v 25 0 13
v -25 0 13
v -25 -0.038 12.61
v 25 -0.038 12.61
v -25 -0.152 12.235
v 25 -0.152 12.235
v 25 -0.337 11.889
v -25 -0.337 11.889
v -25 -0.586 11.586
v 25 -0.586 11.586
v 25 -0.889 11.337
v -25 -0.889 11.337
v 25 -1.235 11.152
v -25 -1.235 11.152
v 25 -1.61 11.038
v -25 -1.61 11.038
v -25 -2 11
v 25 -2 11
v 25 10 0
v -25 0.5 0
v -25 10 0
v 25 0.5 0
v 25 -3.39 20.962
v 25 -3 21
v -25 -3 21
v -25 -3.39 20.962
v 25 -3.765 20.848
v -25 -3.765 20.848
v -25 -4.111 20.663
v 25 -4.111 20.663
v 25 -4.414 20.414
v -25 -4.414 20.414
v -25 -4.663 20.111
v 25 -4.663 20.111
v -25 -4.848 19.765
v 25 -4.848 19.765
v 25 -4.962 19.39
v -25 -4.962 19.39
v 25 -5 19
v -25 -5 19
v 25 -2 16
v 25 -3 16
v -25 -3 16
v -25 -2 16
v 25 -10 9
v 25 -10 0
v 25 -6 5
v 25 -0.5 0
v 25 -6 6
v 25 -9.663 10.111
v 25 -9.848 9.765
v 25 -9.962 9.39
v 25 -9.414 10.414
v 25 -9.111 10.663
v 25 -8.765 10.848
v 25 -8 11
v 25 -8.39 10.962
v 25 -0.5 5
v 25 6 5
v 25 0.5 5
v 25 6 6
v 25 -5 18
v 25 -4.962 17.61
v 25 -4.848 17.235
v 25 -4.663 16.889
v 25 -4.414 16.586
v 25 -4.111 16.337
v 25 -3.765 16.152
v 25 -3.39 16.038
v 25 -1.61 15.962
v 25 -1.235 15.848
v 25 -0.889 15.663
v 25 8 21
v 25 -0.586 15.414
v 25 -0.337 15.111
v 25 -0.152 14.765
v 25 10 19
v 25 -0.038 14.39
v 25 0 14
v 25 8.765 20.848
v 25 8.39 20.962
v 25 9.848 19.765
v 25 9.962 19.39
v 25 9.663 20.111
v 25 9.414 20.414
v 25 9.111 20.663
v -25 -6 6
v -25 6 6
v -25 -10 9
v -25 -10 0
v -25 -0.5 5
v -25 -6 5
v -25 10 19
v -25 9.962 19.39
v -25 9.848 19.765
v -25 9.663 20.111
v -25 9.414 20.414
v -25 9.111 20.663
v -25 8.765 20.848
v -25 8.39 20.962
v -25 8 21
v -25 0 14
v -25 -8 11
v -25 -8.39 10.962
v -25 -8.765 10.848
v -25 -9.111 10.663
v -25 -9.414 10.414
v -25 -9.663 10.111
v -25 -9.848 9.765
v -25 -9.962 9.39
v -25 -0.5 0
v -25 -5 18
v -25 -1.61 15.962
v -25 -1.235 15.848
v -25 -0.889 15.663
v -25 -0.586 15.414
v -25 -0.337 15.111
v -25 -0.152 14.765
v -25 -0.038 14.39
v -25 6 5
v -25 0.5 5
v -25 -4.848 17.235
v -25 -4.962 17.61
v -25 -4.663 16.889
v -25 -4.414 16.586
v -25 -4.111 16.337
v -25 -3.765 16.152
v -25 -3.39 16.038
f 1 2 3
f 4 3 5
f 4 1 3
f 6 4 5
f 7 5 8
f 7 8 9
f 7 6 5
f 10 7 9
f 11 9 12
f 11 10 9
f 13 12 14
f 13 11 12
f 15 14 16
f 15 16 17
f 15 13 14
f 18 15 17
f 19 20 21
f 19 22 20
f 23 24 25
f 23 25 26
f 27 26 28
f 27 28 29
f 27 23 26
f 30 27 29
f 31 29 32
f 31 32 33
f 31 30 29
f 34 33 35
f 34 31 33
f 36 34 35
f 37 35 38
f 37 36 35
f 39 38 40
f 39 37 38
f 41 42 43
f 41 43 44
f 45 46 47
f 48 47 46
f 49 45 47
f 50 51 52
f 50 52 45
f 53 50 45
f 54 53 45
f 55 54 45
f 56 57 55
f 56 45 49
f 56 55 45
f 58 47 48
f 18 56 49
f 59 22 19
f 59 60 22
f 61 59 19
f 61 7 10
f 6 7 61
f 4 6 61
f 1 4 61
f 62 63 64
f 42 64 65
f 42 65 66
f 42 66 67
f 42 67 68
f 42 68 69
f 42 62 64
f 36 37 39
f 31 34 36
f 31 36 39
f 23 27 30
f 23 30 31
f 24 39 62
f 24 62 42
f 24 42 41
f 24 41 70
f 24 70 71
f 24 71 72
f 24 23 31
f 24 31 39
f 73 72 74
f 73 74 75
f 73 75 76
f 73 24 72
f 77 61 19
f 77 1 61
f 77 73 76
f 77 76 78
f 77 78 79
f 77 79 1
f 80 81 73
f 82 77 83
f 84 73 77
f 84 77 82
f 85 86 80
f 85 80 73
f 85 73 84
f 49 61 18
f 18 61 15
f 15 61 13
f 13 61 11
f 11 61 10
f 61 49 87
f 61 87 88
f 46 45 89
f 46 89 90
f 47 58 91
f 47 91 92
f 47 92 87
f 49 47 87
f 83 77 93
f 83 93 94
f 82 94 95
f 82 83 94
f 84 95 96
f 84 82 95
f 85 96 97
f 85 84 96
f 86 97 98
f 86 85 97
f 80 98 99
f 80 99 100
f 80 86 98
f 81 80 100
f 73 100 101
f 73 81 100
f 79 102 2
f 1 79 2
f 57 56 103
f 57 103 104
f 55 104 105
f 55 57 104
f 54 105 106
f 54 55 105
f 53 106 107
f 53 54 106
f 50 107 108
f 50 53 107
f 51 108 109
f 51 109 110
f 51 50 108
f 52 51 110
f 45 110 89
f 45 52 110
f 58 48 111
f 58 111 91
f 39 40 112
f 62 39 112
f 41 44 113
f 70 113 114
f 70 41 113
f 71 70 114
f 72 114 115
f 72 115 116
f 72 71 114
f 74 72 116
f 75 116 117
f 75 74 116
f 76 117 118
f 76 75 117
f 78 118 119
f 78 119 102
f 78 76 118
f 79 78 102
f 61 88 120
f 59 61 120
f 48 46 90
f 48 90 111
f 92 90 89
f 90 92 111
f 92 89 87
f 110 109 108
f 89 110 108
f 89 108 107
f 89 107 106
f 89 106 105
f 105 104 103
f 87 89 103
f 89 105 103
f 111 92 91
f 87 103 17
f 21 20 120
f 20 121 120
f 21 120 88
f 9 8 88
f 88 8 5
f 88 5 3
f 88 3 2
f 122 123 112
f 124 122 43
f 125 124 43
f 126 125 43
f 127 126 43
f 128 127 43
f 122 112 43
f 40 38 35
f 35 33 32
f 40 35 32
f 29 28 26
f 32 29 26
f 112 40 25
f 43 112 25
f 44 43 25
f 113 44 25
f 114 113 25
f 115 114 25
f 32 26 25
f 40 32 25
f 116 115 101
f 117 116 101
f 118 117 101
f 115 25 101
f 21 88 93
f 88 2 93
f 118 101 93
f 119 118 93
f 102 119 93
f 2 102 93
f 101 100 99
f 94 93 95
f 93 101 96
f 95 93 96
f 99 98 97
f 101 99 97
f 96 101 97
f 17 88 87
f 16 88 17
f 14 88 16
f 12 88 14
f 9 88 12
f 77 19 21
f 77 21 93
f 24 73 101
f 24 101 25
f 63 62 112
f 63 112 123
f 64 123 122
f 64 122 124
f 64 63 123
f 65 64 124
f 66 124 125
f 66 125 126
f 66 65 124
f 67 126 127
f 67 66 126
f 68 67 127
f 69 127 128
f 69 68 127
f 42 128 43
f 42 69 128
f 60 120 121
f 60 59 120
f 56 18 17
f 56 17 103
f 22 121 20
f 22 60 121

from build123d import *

# Parameters (mm, degrees)
F1_DEPTH = 25


with BuildPart() as f1:
    # F0 (on Right) → F1 (new body, symmetric)
    with BuildSketch(Plane.YZ):
        with BuildLine():
            Line((0.5, 0), (10, 0))
            Line((10, 0), (10, 19))
            ThreePointArc((10, 19), (9.414214, 20.414214), (8, 21))
            Line((8, 21), (-3, 21))
            ThreePointArc((-3, 21), (-4.414214, 20.414214), (-5, 19))
            Line((-5, 19), (-5, 18))
            ThreePointArc((-5, 18), (-4.414214, 16.585786), (-3, 16))
            Line((-3, 16), (-2, 16))
            ThreePointArc((-2, 16), (-0.585786, 15.414214), (0, 14))
            Line((0, 14), (0, 13))
            ThreePointArc((0, 13), (-0.585786, 11.585786), (-2, 11))
            Line((-2, 11), (-8, 11))
            ThreePointArc((-8, 11), (-9.414214, 10.414214), (-10, 9))
            Line((-10, 9), (-10, 0))
            Line((-10, 0), (-0.5, 0))
            Line((-0.5, 0), (-0.5, 5))
            Line((-0.5, 5), (-6, 5))
            Line((-6, 5), (-6, 6))
            Line((-6, 6), (6, 6))
            Line((6, 6), (6, 5))
            Line((6, 5), (0.5, 5))
            Line((0.5, 5), (0.5, 0))
        make_face()
    extrude(amount=F1_DEPTH, both=True)


solid = f1.part
